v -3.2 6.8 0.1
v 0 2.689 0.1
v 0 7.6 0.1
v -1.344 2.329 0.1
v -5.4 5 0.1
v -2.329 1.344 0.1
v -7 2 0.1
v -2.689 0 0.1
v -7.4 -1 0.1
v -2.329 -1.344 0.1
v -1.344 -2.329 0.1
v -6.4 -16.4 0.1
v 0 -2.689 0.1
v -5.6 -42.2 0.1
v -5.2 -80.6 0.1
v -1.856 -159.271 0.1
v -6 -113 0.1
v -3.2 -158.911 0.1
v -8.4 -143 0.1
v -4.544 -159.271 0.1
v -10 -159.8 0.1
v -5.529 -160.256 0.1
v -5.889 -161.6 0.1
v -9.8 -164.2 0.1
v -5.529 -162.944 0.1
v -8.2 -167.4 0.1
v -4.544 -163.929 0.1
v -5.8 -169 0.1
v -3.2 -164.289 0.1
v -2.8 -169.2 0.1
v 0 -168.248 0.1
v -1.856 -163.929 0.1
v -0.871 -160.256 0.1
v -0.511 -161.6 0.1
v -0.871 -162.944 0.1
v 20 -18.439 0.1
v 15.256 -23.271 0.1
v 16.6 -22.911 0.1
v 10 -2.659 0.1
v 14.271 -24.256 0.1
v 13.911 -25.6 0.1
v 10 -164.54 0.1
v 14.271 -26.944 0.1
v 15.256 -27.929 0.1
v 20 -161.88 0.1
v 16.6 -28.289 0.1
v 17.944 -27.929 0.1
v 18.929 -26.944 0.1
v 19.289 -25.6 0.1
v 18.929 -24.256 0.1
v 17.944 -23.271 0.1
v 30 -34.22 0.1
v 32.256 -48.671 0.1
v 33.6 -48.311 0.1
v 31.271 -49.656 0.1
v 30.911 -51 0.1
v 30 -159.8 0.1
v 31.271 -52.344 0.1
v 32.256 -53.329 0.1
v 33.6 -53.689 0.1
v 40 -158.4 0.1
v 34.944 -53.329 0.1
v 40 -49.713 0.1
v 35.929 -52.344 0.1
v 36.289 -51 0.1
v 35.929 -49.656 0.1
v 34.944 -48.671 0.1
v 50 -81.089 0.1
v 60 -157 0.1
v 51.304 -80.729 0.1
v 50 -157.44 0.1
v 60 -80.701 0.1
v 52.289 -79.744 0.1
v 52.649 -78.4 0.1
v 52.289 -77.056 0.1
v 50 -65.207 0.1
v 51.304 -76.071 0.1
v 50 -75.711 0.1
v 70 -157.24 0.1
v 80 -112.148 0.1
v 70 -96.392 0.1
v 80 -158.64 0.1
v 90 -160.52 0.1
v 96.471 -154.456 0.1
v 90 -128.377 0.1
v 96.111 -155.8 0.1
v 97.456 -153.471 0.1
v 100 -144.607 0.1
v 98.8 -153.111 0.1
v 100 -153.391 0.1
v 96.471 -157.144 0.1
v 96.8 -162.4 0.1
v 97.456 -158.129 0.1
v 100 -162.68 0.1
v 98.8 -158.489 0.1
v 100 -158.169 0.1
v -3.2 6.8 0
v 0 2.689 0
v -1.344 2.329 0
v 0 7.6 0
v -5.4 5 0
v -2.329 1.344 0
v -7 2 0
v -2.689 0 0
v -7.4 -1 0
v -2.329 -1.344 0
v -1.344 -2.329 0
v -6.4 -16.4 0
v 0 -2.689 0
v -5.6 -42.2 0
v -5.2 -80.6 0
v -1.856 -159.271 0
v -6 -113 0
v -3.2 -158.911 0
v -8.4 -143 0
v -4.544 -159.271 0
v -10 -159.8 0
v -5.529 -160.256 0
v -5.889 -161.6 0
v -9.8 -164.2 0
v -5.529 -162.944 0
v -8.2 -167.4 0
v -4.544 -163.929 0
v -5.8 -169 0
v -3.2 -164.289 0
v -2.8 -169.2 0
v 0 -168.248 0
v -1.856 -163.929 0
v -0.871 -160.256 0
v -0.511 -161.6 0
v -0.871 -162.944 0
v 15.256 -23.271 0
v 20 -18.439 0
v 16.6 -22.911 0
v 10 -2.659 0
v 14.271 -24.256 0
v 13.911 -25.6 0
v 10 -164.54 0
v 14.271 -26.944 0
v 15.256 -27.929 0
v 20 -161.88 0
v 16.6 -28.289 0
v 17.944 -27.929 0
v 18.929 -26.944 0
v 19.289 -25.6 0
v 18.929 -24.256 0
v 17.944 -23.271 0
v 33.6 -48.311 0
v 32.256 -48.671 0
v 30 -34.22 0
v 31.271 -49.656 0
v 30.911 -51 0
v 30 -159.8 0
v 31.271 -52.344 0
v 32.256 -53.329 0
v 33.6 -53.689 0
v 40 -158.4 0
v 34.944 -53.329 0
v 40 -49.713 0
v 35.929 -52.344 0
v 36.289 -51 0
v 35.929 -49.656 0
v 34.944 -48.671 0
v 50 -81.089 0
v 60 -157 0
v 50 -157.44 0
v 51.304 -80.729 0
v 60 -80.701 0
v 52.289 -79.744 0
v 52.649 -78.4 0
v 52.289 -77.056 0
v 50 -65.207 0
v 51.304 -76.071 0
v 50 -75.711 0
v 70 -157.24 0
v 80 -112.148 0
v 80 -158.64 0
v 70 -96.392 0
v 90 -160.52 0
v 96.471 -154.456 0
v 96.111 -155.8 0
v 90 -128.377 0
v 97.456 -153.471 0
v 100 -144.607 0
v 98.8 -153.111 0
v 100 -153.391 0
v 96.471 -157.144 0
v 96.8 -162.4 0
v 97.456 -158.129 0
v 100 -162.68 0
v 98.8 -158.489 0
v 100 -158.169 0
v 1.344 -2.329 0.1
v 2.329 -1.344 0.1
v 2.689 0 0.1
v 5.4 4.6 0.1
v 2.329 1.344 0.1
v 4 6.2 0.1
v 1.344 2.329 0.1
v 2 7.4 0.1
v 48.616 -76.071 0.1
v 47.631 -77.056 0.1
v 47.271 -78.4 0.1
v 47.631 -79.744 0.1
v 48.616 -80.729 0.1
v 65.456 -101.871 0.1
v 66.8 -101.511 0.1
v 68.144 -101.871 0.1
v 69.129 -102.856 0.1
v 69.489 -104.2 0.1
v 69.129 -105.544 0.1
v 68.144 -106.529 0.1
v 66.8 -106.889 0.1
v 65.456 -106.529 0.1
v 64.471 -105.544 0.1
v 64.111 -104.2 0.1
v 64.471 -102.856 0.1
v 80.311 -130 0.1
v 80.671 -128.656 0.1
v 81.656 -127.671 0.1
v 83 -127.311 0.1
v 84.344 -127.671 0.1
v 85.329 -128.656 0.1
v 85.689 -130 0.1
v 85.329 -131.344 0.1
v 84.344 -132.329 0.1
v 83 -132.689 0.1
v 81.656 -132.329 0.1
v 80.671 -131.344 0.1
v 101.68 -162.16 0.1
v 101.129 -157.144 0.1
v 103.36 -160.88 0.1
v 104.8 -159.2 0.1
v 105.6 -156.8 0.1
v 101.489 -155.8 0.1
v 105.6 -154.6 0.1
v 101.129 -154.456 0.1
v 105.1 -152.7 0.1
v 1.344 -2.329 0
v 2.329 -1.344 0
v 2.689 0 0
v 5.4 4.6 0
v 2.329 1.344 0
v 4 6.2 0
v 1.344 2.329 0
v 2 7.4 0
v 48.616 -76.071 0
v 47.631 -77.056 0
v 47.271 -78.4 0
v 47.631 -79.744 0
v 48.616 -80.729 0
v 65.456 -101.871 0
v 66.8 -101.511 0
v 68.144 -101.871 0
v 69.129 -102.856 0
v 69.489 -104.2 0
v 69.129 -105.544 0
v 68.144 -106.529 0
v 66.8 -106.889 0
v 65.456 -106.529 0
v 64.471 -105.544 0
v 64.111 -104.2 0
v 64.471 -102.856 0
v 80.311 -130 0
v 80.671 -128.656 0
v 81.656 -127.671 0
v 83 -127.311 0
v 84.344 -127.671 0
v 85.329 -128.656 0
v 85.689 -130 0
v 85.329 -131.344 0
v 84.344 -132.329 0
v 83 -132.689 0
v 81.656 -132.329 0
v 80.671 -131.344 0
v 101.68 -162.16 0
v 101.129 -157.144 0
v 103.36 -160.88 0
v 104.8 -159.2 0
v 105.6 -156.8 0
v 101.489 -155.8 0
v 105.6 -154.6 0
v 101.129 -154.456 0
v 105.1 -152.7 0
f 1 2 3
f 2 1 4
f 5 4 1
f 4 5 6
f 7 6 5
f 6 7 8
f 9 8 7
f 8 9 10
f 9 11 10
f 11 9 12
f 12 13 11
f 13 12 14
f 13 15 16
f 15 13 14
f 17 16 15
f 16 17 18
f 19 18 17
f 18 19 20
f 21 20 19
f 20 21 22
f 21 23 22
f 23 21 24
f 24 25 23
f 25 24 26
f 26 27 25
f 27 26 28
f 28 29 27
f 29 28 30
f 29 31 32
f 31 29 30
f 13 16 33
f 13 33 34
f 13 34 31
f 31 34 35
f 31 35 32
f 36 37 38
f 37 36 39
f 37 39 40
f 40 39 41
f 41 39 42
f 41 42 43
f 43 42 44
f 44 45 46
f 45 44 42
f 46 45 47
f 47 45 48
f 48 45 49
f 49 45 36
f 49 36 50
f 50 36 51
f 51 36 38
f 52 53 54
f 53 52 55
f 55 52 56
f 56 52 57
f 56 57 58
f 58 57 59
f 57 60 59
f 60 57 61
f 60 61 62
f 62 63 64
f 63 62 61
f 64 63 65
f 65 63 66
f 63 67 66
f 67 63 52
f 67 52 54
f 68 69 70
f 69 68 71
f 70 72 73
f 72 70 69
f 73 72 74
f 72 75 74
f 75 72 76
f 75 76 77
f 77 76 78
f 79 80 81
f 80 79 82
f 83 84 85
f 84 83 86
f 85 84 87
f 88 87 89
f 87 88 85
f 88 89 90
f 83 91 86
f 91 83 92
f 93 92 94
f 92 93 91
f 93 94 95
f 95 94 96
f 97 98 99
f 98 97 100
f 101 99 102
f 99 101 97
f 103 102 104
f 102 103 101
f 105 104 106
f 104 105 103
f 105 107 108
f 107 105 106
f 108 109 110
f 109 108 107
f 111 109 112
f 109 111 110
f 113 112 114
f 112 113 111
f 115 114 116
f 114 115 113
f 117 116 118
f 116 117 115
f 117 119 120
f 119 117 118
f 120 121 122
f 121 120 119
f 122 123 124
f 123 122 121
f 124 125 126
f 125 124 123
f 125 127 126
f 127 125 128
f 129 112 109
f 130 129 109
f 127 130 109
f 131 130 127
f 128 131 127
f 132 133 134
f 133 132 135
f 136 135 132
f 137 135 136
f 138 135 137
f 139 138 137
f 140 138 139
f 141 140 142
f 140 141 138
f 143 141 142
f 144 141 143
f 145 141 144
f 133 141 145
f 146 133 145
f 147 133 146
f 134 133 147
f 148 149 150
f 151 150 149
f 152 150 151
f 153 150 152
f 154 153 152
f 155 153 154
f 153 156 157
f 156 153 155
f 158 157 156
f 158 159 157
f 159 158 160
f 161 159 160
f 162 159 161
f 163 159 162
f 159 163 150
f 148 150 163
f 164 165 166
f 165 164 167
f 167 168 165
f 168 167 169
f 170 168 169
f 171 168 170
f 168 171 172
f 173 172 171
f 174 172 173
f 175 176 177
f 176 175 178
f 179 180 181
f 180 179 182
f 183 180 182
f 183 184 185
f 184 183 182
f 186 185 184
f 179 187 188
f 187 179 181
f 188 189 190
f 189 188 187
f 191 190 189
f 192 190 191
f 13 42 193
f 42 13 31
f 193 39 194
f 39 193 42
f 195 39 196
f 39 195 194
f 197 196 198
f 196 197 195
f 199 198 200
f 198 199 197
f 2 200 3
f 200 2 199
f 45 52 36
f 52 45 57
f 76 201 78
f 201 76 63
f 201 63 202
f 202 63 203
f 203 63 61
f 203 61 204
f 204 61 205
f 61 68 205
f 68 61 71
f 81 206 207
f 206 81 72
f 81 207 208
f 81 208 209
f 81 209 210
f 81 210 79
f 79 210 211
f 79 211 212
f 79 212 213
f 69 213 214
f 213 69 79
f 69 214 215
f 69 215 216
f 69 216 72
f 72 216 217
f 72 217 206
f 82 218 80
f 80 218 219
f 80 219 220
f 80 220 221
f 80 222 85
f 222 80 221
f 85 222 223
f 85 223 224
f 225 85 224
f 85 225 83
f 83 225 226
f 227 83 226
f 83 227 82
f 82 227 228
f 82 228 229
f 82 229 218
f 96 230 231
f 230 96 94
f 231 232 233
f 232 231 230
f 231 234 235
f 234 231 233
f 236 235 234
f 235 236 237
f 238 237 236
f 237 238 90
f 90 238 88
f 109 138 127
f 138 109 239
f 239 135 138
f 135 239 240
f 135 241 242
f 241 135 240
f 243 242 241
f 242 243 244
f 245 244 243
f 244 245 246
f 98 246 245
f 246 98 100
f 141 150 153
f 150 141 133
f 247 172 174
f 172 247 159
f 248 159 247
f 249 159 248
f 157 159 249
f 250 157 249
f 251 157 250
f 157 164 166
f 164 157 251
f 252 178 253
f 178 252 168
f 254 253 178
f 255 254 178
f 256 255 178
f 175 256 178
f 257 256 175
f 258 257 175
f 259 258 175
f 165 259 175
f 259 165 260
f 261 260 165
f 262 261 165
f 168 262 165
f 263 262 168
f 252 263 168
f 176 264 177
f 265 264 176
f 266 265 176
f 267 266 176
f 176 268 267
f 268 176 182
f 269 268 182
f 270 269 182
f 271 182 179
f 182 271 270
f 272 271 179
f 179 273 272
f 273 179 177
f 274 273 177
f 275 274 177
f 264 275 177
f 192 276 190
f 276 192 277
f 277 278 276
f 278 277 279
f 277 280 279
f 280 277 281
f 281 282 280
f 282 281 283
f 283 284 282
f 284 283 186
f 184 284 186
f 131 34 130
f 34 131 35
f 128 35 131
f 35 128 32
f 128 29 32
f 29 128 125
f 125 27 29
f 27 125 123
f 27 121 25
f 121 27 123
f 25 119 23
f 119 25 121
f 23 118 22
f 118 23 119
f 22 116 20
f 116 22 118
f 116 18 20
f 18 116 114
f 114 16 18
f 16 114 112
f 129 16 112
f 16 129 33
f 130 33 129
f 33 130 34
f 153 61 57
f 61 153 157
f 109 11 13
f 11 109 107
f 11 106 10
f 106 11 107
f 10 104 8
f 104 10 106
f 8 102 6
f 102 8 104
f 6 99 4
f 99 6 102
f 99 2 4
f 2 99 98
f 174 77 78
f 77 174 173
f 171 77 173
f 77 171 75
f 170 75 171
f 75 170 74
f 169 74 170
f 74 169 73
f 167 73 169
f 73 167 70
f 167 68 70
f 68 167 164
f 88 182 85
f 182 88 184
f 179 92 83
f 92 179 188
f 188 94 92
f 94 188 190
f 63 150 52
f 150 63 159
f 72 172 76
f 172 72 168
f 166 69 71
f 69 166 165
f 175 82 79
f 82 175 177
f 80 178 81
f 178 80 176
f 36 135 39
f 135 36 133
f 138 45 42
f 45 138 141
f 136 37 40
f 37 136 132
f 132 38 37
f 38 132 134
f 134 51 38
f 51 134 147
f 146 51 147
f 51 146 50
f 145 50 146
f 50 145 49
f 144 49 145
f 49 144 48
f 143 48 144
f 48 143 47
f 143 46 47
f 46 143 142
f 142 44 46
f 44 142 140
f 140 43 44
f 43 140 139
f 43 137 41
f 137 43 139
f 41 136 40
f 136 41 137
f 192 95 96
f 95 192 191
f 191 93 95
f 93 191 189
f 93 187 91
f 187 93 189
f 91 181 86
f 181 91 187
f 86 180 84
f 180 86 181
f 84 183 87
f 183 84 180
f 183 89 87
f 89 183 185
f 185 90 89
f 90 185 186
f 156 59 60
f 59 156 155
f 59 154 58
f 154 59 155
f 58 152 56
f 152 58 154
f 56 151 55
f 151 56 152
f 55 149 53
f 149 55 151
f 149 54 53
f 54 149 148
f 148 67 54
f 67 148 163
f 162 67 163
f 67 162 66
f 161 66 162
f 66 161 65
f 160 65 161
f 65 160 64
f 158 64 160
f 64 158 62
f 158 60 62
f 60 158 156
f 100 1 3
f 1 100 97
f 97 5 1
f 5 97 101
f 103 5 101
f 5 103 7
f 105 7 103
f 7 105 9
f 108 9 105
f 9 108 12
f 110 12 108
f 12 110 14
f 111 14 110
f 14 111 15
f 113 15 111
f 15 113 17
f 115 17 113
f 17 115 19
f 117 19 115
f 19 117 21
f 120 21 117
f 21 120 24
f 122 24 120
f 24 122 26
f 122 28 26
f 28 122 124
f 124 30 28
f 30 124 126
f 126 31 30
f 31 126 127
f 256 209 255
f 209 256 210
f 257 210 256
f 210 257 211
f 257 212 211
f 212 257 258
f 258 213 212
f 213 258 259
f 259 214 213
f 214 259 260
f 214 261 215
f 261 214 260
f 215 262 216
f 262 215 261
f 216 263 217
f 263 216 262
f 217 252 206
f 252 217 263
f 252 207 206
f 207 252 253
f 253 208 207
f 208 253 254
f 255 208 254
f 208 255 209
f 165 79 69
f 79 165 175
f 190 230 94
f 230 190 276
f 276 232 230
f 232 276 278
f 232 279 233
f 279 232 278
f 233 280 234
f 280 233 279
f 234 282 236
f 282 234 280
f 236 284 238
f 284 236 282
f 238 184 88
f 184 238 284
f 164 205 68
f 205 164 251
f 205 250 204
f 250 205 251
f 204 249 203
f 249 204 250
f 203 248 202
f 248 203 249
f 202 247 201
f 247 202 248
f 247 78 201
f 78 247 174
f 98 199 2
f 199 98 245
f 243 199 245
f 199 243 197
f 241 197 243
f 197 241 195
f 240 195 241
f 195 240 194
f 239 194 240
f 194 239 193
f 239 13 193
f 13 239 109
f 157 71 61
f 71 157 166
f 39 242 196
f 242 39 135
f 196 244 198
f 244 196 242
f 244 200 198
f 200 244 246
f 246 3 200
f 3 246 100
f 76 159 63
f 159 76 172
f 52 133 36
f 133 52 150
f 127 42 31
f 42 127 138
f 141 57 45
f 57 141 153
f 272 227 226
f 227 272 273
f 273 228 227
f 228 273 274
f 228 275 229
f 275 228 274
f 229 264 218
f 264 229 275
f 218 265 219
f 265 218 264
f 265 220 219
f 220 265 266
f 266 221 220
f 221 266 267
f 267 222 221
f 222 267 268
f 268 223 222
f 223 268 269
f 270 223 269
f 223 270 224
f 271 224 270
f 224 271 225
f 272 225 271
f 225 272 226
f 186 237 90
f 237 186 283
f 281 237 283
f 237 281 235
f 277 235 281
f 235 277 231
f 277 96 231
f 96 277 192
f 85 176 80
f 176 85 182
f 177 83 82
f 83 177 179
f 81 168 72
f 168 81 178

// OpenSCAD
use <../lib.scad>
use <s/u9496p02s01.scad>
use <s/u9496p02s02.scad>
use <s/u9496p02s03.scad>
use <s/u9496p02s04.scad>
function ldraw_lib__u9496p02() = [
// 0 Sail 15 x 22 Triangular with Thin Stripes on White Background Pattern
// 0 Name: u9496p02.dat
// 0 Author: Philippe Hurbain [Philo]
// 0 !LDRAW_ORG Part UPDATE 2025-08
// 0 !LICENSE Licensed under CC BY 4.0 : see CAreadme.txt
// 
// 0 BFC CERTIFY CCW
  [0,"BFC","CERTIFY"],
  [0,"BFC","CCW"],
// 
// 0 !CATEGORY Sheet Fabric
// 0 !KEYWORDS Armada Flagship, BrickLink 71308, eLAB Renewable Energy Set
// 0 !KEYWORDS Rebrickable 71308pr0001, set 6280, set 6291, set 9681, set 9684
// 0 !KEYWORDS Spaniard Ship
// 
// 0 !HISTORY 2025-08-31 [OrionP] Official Update 2025-08
// 
// 1 16 0 -0.25 0 1 0 0 0 1 0 0 0 1 s\u9496p02s01.dat
  [1,16,0,-0.25,0,1,0,0,0,1,0,0,0,1, ldraw_lib__s__u9496p02s01()],
// 1 16 0 0 0 1 0 0 0 -1 0 0 0 1 s\u9496p02s01.dat
  [1,16,0,0,0,1,0,0,0,-1,0,0,0,1, ldraw_lib__s__u9496p02s01()],
// 
// 1 20015 0 -.25 0 1 0 0 0 1 0 0 0 1 s\u9496p02s02.dat
  [1,20015,0,-.25,0,1,0,0,0,1,0,0,0,1, ldraw_lib__s__u9496p02s02()],
// 1 20015 0 0 0 1 0 0 0 -1 0 0 0 1 s\u9496p02s02.dat
  [1,20015,0,0,0,1,0,0,0,-1,0,0,0,1, ldraw_lib__s__u9496p02s02()],
// 
// 1 16 0 0 0 1 0 0 0 1 0 0 0 1 s\u9496p02s03.dat
  [1,16,0,0,0,1,0,0,0,1,0,0,0,1, ldraw_lib__s__u9496p02s03()],
// 1 20015 0 0 0 1 0 0 0 1 0 0 0 1 s\u9496p02s04.dat
  [1,20015,0,0,0,1,0,0,0,1,0,0,0,1, ldraw_lib__s__u9496p02s04()],
];
module ldraw_lib__u9496p02(step=0, col=false, unit=2/5, alt=false, line=0.2, solid=!$preview)
    makepoly(ldraw_lib__u9496p02(), step=step, col=col, unit=unit, alt=alt, line=line, solid=solid);
ldraw_lib__u9496p02(line=0.2);
